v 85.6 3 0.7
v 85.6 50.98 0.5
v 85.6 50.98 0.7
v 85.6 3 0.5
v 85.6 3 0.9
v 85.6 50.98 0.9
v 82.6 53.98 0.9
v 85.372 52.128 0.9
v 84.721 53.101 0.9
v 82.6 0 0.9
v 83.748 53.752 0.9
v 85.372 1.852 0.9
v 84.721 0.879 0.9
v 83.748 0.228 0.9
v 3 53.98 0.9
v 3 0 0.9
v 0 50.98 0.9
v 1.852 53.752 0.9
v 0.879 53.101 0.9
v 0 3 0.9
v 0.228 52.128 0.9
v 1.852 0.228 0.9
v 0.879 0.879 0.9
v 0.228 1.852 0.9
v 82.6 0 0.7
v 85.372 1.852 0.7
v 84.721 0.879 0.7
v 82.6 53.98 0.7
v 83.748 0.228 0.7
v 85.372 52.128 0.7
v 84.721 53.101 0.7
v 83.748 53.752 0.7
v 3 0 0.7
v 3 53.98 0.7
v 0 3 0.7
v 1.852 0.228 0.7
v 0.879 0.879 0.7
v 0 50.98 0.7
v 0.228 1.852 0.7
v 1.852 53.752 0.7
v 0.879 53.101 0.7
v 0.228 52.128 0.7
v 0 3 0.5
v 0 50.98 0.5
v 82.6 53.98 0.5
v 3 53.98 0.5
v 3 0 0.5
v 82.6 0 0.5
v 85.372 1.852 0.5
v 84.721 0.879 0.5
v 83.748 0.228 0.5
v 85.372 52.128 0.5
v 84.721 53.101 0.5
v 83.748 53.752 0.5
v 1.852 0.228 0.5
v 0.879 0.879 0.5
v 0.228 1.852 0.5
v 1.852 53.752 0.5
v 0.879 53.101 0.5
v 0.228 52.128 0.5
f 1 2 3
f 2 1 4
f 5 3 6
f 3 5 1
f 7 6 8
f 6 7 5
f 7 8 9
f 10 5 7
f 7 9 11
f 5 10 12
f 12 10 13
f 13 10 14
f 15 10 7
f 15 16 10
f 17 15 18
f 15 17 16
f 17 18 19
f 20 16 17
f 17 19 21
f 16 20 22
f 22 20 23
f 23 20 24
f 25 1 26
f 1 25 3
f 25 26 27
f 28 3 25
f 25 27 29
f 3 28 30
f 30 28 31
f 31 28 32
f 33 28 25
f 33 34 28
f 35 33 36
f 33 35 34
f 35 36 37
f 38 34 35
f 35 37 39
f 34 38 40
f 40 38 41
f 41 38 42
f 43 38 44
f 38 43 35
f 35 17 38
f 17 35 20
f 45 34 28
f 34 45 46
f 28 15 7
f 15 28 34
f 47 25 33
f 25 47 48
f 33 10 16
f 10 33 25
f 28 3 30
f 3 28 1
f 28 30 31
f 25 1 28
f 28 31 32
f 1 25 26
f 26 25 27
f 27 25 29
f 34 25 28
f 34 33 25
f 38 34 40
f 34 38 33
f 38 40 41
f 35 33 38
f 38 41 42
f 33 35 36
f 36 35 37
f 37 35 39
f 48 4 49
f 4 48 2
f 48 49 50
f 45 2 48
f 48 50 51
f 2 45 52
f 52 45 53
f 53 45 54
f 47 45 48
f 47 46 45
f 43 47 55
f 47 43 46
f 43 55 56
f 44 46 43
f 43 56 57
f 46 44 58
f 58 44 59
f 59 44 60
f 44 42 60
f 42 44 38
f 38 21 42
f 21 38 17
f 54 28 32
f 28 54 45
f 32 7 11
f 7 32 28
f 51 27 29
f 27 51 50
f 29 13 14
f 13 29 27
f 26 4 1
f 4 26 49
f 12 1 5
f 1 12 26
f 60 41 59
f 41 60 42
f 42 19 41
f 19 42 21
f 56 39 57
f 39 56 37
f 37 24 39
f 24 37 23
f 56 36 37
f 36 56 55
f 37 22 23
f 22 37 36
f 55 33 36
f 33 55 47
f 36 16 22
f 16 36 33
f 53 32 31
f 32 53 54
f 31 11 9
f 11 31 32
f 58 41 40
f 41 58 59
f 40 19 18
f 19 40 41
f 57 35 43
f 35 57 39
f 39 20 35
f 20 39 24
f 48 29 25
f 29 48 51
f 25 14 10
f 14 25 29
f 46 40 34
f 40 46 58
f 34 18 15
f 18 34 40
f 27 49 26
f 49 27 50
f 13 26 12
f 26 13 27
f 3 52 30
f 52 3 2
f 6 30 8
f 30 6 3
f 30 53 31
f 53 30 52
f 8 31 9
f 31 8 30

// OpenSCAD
1st_layer_height = 0.3;
layer_height = 0.2;
cc_x = 85.6;
cc_y = 53.98;
flag_layers = 2;
corner_radius = 3;
$fn=16;

intersection () {
	hull () {
		translate ([corner_radius,corner_radius,-layer_height]) cylinder (r=corner_radius, h=1st_layer_height+layer_height*5);
		translate ([corner_radius,cc_y-corner_radius,-layer_height]) cylinder (r=corner_radius, h=1st_layer_height+layer_height*5);
		translate ([cc_x-corner_radius,cc_y-corner_radius,-layer_height]) cylinder (r=corner_radius, h=1st_layer_height+layer_height*5);
		translate ([cc_x-corner_radius,corner_radius,-layer_height]) cylinder (r=corner_radius, h=1st_layer_height+layer_height*5);
		}

	translate ([0,0,0]) {
		
		// Layer 1,2
			
		color ("White") linear_extrude (height = 1st_layer_height+layer_height, convexity = 10) 
		translate ([0,cc_y,0]) mirror ([0,1,0]) import(file = "Union flag white.dxf");
		
		color ("Red") linear_extrude (height = 1st_layer_height+layer_height, convexity = 10) 
		translate ([0,cc_y,0]) mirror ([0,1,0]) import(file = "Union flag red.dxf");
		
		color ("Blue") linear_extrude (height = 1st_layer_height+layer_height, convexity = 10) 
		translate ([0,cc_y,0]) mirror ([0,1,0]) import(file = "Union flag blue.dxf");
		
		
		
		// Layer 3

		translate ([0,0,1st_layer_height+layer_height]) color ("White") cube ([cc_x,cc_y,layer_height]);

		// Layer 4
		
		translate ([0,0,1st_layer_height+layer_height+layer_height]) {
			difference () {
				color ("Blue") cube ([cc_x,cc_y,layer_height]);
				translate ([0,0,-layer_height]) linear_extrude (height = layer_height*3, convexity = 10) 
				import(file = "reprappro_words_ian.dxf");
			}
			
			color ("White") linear_extrude (height = layer_height, convexity = 10) import(file = "reprappro_words_ian.dxf");
		
		}
	}	
}
